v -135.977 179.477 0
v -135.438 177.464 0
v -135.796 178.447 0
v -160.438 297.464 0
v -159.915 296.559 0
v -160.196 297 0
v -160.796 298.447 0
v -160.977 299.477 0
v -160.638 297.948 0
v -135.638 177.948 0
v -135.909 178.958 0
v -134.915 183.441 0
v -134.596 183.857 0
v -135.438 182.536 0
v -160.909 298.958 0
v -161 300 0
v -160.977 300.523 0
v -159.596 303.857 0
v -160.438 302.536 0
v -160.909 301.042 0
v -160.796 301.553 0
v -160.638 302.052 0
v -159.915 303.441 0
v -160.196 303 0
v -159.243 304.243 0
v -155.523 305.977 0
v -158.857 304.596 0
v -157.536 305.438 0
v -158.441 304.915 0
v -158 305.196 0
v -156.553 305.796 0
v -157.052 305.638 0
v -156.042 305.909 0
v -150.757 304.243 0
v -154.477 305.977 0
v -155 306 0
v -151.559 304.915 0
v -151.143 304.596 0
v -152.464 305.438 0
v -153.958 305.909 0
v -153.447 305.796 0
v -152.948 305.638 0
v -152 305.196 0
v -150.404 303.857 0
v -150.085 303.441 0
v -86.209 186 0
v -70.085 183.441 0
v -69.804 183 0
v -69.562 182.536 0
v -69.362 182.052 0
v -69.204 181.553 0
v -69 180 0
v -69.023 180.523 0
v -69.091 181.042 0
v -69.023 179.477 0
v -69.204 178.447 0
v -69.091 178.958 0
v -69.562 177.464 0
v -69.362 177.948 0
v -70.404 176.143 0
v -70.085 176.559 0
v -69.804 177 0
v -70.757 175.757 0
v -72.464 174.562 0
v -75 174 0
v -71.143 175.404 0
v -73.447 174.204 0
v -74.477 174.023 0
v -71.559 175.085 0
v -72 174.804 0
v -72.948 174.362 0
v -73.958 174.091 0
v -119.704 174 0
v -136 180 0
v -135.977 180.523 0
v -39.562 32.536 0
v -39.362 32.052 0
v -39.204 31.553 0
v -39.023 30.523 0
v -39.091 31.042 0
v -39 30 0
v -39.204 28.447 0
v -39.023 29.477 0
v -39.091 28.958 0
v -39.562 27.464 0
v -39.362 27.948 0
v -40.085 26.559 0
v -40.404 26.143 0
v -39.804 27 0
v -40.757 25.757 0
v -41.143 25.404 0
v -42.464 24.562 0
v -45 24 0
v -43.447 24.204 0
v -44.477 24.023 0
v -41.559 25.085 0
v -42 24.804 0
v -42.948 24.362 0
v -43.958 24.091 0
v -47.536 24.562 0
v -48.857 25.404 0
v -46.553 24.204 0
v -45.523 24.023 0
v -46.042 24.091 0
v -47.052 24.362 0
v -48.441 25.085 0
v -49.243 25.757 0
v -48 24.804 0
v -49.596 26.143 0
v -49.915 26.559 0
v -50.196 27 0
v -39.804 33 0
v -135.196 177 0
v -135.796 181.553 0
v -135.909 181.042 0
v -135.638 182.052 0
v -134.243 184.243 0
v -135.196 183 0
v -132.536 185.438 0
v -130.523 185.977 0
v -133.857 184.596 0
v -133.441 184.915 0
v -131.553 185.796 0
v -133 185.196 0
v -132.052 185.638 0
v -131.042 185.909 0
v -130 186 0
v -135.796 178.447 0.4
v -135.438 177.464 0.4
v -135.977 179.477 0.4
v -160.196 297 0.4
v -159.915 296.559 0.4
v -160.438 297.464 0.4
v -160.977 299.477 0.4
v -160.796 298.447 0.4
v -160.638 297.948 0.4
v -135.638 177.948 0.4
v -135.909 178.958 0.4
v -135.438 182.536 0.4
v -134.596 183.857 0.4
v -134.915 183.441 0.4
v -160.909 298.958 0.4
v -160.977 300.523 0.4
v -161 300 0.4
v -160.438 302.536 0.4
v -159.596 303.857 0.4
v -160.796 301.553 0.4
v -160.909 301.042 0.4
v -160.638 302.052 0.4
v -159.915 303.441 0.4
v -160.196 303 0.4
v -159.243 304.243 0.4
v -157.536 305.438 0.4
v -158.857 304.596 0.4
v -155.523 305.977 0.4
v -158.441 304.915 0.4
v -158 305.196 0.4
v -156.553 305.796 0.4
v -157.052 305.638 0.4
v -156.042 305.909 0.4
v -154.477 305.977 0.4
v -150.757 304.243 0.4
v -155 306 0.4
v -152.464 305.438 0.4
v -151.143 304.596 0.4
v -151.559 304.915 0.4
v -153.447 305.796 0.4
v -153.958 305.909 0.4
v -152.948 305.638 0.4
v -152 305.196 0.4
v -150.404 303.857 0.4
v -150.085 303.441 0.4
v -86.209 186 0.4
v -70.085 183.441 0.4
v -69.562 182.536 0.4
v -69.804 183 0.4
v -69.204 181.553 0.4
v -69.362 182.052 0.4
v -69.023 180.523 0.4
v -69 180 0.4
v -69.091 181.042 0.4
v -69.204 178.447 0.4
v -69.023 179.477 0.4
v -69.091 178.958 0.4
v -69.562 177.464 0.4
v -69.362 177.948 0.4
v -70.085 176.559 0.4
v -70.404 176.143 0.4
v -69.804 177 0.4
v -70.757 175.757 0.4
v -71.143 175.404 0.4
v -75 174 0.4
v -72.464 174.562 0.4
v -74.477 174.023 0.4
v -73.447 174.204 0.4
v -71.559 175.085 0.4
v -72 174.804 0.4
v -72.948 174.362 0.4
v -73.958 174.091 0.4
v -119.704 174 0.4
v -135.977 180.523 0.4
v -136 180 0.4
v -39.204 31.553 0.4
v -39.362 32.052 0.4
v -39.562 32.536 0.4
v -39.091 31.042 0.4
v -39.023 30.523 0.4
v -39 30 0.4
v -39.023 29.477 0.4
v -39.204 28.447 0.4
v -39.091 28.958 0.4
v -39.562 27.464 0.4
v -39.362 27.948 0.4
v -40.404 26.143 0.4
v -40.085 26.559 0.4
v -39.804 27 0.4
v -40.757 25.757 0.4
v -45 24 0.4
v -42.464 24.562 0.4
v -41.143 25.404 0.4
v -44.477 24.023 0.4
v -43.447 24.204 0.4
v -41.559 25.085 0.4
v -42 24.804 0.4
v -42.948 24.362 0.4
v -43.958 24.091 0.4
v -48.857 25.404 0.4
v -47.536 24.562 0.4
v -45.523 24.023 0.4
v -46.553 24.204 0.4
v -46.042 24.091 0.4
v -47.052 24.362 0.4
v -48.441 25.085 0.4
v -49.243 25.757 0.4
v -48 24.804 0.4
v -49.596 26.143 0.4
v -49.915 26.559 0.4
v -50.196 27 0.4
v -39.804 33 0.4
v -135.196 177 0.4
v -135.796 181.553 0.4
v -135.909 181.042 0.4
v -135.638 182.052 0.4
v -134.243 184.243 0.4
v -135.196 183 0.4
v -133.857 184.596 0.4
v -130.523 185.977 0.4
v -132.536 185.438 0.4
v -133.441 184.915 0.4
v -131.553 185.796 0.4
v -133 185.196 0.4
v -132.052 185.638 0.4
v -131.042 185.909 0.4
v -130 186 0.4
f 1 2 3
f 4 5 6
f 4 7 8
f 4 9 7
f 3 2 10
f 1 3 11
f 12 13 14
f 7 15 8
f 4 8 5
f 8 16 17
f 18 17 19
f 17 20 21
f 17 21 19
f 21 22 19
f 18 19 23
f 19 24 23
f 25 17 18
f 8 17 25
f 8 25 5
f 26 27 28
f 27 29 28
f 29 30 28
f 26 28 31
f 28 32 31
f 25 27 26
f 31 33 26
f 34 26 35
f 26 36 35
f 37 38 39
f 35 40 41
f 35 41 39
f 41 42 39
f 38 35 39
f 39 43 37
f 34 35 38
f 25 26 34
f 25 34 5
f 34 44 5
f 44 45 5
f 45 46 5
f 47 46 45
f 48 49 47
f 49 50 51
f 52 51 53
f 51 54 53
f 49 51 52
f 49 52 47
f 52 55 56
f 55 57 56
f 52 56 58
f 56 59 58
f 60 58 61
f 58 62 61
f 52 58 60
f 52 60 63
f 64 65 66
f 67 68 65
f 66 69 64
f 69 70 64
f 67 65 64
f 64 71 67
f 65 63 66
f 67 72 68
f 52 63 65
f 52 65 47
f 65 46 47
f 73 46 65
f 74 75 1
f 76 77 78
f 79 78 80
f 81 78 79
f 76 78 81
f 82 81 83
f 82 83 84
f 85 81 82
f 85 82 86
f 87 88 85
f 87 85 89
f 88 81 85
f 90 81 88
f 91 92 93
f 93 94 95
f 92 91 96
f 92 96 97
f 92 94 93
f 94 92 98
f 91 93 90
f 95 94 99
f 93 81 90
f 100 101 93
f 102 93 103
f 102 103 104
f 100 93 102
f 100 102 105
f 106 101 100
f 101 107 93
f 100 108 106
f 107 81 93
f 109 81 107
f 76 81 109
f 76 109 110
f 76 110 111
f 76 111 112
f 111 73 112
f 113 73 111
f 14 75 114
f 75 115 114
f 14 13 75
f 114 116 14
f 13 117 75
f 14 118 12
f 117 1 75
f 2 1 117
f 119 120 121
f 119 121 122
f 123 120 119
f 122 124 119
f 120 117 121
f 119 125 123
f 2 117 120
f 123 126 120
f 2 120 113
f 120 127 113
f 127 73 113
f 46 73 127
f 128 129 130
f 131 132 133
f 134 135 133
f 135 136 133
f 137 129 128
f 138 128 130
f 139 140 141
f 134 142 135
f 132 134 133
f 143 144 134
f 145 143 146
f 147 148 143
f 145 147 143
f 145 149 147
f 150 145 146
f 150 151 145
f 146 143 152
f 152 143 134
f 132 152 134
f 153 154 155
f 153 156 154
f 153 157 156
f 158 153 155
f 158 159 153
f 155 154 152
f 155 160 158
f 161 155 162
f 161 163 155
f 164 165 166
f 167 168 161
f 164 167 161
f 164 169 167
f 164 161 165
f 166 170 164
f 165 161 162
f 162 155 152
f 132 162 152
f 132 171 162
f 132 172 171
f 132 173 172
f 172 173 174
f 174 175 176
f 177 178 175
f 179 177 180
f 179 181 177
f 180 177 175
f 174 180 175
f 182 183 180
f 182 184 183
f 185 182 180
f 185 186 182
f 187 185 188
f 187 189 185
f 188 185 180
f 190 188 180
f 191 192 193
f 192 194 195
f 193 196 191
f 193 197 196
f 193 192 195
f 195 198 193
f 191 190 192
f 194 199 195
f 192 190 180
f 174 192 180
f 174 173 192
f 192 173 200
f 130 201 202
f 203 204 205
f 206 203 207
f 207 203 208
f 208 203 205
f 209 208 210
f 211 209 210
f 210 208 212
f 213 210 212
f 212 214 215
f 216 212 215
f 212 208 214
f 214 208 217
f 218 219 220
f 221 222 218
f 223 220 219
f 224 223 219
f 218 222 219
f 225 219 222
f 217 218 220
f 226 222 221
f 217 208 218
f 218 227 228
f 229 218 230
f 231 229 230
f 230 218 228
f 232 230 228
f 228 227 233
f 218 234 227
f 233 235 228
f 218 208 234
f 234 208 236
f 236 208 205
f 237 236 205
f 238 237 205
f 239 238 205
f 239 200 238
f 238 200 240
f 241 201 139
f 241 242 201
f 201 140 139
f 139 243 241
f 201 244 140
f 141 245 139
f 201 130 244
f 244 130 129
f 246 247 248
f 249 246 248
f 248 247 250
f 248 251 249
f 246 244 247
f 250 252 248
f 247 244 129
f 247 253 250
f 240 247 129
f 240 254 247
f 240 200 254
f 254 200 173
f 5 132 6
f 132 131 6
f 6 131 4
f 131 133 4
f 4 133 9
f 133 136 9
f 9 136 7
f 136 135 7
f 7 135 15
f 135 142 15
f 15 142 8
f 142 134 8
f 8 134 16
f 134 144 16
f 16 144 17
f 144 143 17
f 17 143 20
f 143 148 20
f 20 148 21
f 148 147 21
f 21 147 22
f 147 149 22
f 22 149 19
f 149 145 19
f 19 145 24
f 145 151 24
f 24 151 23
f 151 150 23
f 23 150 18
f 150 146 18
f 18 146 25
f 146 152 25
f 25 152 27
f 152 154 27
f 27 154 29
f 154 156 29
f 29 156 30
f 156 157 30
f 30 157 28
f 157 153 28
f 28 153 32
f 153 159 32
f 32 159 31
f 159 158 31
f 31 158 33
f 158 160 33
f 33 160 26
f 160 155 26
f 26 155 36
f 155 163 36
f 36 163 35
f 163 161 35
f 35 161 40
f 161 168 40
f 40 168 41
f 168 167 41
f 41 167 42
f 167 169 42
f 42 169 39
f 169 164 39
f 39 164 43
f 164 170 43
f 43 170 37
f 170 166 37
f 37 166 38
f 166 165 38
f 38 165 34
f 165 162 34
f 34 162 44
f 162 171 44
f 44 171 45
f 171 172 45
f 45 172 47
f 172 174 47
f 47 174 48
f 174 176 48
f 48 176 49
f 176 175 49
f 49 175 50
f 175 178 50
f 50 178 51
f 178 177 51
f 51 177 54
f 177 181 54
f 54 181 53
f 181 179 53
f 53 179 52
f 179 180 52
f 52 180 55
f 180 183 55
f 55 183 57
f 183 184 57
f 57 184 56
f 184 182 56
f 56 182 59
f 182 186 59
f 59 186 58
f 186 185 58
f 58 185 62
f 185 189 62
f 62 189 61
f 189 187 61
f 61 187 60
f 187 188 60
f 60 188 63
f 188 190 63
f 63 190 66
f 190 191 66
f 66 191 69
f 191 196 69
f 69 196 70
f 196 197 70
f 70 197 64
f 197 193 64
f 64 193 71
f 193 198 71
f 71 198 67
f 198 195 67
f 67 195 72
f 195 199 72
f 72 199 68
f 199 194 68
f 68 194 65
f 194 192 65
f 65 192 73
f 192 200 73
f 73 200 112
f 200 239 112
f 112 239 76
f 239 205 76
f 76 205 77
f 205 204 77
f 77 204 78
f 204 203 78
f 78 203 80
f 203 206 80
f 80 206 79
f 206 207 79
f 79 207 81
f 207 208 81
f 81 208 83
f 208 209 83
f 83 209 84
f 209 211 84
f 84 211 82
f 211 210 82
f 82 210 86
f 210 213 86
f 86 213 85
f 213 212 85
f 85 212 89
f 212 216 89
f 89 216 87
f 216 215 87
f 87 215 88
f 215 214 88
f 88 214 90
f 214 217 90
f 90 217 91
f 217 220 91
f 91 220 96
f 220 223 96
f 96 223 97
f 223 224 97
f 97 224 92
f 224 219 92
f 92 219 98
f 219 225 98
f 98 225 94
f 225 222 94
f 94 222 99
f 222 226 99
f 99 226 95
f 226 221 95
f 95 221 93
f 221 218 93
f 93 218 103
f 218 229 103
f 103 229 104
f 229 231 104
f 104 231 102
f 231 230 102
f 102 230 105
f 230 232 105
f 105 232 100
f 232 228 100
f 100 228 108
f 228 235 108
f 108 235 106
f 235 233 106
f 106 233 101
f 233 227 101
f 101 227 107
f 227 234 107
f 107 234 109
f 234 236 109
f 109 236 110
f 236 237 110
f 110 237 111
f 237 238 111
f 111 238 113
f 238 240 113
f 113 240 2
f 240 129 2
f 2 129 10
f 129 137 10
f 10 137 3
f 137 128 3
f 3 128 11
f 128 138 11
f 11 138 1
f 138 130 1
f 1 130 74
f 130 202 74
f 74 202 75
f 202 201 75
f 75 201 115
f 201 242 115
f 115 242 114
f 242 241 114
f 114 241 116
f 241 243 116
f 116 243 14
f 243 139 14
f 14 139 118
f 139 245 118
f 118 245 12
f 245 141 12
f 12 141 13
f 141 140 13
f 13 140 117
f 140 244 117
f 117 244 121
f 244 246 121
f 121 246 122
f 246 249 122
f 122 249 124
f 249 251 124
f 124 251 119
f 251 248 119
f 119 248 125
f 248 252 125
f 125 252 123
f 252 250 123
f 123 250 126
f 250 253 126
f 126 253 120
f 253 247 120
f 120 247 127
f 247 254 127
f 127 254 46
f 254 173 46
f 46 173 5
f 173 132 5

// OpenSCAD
// file: ../collar.scad
// Calibrated press-fit collar, merged into the rear wall at each pixel.
// The STL is symmetric top/bottom (retention lip at mid-height), so insertion
// direction does not matter. Native STL sits X-centered at collar_cx, Z 0..collar_h.

module collar_solid() {
    translate([-collar_cx, 0, 0])
        import(collar_stl, convexity = 6);
}

module place_collar(x, y) {
    translate([x, y, 0]) collar_solid();
}
// file: ../config.scad
// ===== CHARGE LED sign — global config =====
// Edit this file; then run ./build.sh to regenerate every STL.

$fn = 72;

// ---- bullet pixel datasheet (measured + validated) ----
// dome Ø8, barrel Ø12, flange Ø13.6 x 2mm, dome-tip -> flange 5.5mm.
// Above the plate: ~Ø12 barrel for ~0.5mm, then the Ø8 dome to a tip ~dome_clear
// above the plate front. Drives pixel_through, dome_clear, and led_void clearances.

// ---- calibrated collar (press-fit for 12mm bullet pixel) ----
collar_stl    = "../../assets/bullet-collar.stl"; // path resolved from src/parts/ entry files
collar_h      = 2.0;     // Z span of the collar STL
collar_od     = 16.0;    // collar outer diameter
collar_cx     = 43.0;    // STL native X center (Y center is 0)
pixel_through = 12.3;    // clearance hole through the plate (just over bore Ø12.19)
dome_clear    = 4.0;     // dome protrusion above plate front. Spec: 5.5mm dome-tip-to-flange,
                         // flange seats on plate back, minus 2mm plate ~= 3.5-4mm. Seat a real
                         // pixel and measure to lock it in.

// ---- shell ----
plate_t    = 2.0;        // rear plate thickness (== collar_h, so the collar sits flush)
wall_t     = 2.5;        // chimney wall thickness
cell_inner = 30;         // square interior of each test cell (the press-fit opening)

// ---- diffuser panels (flat, drop-in — kept for the final glued option) ----
panel_press_clear = 0.25; // panel is this much SMALLER than the opening (total) -> friction fit
panel_thicks      = [1, 2, 3];

// ---- diffuser CAP (slides over an ISOLATED chimney; not used on touching rows) ----
cap_fit_clear = 0.4;   // skirt-inner minus chimney-outer (total); bigger = looser slide
cap_skirt_t   = 1.6;   // skirt wall thickness
cap_skirt_h   = 7;     // how far the skirt grips down over the chimney

// ---- diffuser LID = flanged plug (plug locates in the opening, flange catches on the rim) ----
lid_flange_cover = wall_t;  // flange overhang per side ~= wall width (rests on rim, can't fall in)
lid_flange_gap   = 0.3;     // shrink the flange a hair so neighbour lids don't clash
lid_plug_h       = 4;       // how far the plug drops into the opening (0 = plain flat tile)
lid_plug_clear   = 0.2;     // plug-outer = opening minus this (total) -> friction fit
                            // (was 0.5/loose; PETG plug in a PLA hole grips well at 0.2)
lid_plug_wall    = 1.5;     // plug-frame wall thickness

// ---- coupon depth ladder ----
led_gaps = [10, 15, 20]; // clear LED-tip -> diffuser distance, per cell (mm)
                         // (was [20,35,50] — 35/50 went too dim/washed; 20 is the new max)

// ---- collar v2: original bore + lip, plus a 45-deg lead-in chamfer ----
bore_face_r   = 6.10;    // collar bore radius at each face (~Ø12.2)
chamfer_depth = 0.5;     // axial depth of the 45-deg lead-in at each face
mouth_r       = bore_face_r + chamfer_depth;  // chamfer mouth radius (~Ø13.2)

// ---- collar A/B test harness ----
harness_w     = 52;      // tile width
harness_d     = 30;      // tile depth
harness_t     = plate_t; // match the real wall thickness for a faithful fit test
harness_pitch = 24;      // spacing between the two hole centers

// ---- derived ----
cell_pitch = cell_inner + 2 * wall_t;      // outer cell footprint (35)
n_cells    = len(led_gaps);
plate_w    = n_cells * cell_pitch;
plate_d    = cell_pitch;
panel_side = cell_inner - panel_press_clear;
function cell_x(i)     = i * cell_pitch + cell_pitch / 2;   // column center (distance)
function cell_y(j)     = j * cell_pitch + cell_pitch / 2;   // row center (for grid coupons)
function chimney_H(i)  = plate_t + dome_clear + led_gaps[i];
// main file
// V1 WHITE part: white CENTER stripe on the viewer/bed face. filament 1.
include <../config.scad>
include <../collar.scad>
include <../bolt.scad>
bolt_lens_v1_white();
